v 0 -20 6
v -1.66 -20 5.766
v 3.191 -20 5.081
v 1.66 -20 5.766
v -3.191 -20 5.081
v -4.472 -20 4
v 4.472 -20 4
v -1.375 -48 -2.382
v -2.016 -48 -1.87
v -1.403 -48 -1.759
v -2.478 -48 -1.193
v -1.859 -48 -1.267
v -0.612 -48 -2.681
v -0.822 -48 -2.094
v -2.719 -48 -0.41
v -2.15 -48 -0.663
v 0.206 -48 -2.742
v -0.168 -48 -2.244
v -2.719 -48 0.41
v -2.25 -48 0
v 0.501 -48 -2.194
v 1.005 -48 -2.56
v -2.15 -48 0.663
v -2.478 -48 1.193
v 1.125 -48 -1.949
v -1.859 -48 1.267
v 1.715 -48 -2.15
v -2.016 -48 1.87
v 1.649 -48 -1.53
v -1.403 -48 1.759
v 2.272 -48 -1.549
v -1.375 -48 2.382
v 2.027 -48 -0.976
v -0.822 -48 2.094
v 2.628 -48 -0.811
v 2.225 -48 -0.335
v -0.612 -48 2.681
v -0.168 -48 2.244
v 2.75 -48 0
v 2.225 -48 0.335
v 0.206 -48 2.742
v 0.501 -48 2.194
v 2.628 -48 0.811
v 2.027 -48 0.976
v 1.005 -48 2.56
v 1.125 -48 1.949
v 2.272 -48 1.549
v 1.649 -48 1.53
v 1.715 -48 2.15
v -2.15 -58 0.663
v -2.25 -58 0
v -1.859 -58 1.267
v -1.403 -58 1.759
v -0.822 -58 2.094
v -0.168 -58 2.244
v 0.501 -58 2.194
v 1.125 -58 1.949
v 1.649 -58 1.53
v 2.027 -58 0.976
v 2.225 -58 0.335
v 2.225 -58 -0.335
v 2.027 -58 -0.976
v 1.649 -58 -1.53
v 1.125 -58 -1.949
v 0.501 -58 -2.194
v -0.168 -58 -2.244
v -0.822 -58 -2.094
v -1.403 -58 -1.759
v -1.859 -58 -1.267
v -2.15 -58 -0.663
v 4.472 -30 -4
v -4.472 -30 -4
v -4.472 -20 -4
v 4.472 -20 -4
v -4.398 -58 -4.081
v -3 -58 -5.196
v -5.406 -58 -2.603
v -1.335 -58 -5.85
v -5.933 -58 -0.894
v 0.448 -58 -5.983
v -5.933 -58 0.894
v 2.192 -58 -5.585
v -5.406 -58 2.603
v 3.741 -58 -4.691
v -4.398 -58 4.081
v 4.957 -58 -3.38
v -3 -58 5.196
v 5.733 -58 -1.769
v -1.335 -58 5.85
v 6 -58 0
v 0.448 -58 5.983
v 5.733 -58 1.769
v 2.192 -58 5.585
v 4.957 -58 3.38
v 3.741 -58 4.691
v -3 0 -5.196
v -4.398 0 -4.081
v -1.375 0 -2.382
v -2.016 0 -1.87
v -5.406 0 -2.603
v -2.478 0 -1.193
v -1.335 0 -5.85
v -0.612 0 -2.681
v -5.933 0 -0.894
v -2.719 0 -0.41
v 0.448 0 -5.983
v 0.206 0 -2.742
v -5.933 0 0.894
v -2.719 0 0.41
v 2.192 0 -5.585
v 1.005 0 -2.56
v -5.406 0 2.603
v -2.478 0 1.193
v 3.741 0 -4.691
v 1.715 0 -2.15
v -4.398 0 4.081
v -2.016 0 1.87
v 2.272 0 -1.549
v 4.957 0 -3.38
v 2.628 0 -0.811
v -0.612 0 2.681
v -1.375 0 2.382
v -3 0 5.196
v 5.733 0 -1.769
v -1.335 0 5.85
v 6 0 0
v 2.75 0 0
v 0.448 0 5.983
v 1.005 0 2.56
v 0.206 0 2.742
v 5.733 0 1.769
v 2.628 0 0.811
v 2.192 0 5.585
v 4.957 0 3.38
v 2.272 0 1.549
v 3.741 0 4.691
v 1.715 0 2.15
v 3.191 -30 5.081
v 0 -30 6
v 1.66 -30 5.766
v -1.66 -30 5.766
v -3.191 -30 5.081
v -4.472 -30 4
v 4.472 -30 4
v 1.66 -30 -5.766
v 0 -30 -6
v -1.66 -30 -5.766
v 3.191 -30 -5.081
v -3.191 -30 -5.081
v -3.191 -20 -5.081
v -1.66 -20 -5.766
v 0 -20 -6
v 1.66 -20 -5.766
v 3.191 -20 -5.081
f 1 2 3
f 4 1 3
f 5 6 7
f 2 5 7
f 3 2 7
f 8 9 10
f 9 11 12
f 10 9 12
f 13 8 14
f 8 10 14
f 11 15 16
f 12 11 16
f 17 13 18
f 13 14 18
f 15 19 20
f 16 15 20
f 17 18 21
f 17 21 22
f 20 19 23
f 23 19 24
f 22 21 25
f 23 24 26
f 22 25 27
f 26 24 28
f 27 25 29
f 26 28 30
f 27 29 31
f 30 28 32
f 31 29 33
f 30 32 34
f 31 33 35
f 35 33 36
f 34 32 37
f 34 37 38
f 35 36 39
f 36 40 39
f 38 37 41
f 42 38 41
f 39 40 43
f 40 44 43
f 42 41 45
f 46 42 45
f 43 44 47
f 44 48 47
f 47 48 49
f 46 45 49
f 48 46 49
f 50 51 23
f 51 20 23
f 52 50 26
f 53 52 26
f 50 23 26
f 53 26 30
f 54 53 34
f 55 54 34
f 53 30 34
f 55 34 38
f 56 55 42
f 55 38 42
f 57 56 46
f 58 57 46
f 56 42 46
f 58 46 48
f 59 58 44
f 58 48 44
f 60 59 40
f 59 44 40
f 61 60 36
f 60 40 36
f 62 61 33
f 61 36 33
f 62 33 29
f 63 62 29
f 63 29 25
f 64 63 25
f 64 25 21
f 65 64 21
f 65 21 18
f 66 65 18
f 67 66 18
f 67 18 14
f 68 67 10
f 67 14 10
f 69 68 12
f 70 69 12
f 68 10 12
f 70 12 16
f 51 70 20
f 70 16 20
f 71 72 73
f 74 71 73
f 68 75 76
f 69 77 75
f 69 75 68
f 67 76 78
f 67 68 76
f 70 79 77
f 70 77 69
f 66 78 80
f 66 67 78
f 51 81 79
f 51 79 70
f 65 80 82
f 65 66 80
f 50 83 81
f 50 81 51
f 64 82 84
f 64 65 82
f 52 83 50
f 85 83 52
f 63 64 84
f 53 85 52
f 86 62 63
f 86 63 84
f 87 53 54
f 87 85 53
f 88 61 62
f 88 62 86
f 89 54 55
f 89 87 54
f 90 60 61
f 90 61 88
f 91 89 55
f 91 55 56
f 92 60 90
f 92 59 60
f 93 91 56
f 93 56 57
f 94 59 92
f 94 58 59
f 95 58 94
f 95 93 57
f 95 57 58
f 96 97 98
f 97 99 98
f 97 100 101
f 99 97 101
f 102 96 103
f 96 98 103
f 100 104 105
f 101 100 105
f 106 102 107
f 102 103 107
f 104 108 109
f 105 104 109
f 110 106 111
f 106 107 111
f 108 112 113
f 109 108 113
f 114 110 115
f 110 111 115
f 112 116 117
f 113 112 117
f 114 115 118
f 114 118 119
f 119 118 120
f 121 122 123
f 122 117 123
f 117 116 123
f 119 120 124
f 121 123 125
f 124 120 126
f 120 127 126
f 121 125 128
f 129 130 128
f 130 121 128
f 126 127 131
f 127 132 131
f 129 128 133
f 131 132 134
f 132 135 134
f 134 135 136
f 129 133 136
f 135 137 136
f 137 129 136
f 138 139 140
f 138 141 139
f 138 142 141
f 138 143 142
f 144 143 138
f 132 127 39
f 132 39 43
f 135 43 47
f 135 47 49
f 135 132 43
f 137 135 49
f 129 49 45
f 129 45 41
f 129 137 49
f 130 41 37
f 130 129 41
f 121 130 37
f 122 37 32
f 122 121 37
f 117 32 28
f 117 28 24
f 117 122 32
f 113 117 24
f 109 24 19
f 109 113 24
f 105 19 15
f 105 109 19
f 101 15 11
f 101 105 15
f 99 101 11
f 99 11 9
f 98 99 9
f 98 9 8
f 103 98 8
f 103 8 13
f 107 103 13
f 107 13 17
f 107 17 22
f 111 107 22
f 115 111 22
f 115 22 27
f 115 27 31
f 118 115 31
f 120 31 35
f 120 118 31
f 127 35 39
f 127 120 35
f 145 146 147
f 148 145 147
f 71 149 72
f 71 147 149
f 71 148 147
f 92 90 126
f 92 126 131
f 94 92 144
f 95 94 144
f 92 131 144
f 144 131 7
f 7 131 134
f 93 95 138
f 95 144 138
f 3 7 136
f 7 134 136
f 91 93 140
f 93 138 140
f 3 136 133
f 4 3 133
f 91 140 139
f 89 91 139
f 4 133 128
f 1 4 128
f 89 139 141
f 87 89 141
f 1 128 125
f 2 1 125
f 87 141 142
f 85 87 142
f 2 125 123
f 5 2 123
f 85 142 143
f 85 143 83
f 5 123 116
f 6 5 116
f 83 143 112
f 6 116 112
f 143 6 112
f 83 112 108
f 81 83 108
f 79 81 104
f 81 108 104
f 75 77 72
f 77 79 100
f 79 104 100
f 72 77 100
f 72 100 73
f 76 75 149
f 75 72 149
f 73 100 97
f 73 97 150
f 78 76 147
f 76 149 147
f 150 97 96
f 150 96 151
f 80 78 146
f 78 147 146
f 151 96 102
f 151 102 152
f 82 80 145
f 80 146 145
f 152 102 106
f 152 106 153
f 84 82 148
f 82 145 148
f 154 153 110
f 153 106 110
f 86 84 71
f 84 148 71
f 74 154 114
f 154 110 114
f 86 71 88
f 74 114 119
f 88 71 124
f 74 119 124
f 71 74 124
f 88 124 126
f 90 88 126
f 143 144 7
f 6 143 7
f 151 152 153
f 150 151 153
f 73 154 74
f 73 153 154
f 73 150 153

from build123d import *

# Parameters (mm, degrees)
F0_R          = 6
F1_DEPTH      = 58
F2_R          = 2.75
F3_DEPTH      = 48
F4_W          = 10
F4_H          = 2
F5_DEPTH      = 6.001
F5_DEPTH_BACK = 6.001
F7_D          = 4.5
F7_DEPTH      = 10
F7_TIP        = 1.3519363928


with BuildPart() as f1:
    # F0 (on Front) → F1 (new body)
    with BuildSketch(Plane.XZ):
        Circle(F0_R)
    extrude(amount=F1_DEPTH)

    # F2 (on Front) → F3 (cut)
    with BuildSketch(Plane.XZ):
        Circle(F2_R)
    extrude(amount=F3_DEPTH, mode=Mode.SUBTRACT)

    # F4 (on Right) → F5 (cut, two sides)
    with BuildSketch(Plane.YZ) as f5_sk:
        with Locations((-25, -5)):
            Rectangle(F4_W, F4_H)
        with Locations((-25, 5)):
            Rectangle(F4_W, F4_H)
    extrude(amount=F5_DEPTH, mode=Mode.SUBTRACT)
    extrude(f5_sk.sketch, amount=-F5_DEPTH_BACK, mode=Mode.SUBTRACT)

    # F7
    with Locations(Plane.XZ.offset(58)):
        with Locations((0, 0)):
            Hole(F7_D / 2, depth=F7_DEPTH)
            with Locations((0, 0, -(F7_DEPTH + F7_TIP / 2))):  # 118° drill point
                Cone(0, F7_D / 2, F7_TIP, mode=Mode.SUBTRACT)


solid = f1.part
